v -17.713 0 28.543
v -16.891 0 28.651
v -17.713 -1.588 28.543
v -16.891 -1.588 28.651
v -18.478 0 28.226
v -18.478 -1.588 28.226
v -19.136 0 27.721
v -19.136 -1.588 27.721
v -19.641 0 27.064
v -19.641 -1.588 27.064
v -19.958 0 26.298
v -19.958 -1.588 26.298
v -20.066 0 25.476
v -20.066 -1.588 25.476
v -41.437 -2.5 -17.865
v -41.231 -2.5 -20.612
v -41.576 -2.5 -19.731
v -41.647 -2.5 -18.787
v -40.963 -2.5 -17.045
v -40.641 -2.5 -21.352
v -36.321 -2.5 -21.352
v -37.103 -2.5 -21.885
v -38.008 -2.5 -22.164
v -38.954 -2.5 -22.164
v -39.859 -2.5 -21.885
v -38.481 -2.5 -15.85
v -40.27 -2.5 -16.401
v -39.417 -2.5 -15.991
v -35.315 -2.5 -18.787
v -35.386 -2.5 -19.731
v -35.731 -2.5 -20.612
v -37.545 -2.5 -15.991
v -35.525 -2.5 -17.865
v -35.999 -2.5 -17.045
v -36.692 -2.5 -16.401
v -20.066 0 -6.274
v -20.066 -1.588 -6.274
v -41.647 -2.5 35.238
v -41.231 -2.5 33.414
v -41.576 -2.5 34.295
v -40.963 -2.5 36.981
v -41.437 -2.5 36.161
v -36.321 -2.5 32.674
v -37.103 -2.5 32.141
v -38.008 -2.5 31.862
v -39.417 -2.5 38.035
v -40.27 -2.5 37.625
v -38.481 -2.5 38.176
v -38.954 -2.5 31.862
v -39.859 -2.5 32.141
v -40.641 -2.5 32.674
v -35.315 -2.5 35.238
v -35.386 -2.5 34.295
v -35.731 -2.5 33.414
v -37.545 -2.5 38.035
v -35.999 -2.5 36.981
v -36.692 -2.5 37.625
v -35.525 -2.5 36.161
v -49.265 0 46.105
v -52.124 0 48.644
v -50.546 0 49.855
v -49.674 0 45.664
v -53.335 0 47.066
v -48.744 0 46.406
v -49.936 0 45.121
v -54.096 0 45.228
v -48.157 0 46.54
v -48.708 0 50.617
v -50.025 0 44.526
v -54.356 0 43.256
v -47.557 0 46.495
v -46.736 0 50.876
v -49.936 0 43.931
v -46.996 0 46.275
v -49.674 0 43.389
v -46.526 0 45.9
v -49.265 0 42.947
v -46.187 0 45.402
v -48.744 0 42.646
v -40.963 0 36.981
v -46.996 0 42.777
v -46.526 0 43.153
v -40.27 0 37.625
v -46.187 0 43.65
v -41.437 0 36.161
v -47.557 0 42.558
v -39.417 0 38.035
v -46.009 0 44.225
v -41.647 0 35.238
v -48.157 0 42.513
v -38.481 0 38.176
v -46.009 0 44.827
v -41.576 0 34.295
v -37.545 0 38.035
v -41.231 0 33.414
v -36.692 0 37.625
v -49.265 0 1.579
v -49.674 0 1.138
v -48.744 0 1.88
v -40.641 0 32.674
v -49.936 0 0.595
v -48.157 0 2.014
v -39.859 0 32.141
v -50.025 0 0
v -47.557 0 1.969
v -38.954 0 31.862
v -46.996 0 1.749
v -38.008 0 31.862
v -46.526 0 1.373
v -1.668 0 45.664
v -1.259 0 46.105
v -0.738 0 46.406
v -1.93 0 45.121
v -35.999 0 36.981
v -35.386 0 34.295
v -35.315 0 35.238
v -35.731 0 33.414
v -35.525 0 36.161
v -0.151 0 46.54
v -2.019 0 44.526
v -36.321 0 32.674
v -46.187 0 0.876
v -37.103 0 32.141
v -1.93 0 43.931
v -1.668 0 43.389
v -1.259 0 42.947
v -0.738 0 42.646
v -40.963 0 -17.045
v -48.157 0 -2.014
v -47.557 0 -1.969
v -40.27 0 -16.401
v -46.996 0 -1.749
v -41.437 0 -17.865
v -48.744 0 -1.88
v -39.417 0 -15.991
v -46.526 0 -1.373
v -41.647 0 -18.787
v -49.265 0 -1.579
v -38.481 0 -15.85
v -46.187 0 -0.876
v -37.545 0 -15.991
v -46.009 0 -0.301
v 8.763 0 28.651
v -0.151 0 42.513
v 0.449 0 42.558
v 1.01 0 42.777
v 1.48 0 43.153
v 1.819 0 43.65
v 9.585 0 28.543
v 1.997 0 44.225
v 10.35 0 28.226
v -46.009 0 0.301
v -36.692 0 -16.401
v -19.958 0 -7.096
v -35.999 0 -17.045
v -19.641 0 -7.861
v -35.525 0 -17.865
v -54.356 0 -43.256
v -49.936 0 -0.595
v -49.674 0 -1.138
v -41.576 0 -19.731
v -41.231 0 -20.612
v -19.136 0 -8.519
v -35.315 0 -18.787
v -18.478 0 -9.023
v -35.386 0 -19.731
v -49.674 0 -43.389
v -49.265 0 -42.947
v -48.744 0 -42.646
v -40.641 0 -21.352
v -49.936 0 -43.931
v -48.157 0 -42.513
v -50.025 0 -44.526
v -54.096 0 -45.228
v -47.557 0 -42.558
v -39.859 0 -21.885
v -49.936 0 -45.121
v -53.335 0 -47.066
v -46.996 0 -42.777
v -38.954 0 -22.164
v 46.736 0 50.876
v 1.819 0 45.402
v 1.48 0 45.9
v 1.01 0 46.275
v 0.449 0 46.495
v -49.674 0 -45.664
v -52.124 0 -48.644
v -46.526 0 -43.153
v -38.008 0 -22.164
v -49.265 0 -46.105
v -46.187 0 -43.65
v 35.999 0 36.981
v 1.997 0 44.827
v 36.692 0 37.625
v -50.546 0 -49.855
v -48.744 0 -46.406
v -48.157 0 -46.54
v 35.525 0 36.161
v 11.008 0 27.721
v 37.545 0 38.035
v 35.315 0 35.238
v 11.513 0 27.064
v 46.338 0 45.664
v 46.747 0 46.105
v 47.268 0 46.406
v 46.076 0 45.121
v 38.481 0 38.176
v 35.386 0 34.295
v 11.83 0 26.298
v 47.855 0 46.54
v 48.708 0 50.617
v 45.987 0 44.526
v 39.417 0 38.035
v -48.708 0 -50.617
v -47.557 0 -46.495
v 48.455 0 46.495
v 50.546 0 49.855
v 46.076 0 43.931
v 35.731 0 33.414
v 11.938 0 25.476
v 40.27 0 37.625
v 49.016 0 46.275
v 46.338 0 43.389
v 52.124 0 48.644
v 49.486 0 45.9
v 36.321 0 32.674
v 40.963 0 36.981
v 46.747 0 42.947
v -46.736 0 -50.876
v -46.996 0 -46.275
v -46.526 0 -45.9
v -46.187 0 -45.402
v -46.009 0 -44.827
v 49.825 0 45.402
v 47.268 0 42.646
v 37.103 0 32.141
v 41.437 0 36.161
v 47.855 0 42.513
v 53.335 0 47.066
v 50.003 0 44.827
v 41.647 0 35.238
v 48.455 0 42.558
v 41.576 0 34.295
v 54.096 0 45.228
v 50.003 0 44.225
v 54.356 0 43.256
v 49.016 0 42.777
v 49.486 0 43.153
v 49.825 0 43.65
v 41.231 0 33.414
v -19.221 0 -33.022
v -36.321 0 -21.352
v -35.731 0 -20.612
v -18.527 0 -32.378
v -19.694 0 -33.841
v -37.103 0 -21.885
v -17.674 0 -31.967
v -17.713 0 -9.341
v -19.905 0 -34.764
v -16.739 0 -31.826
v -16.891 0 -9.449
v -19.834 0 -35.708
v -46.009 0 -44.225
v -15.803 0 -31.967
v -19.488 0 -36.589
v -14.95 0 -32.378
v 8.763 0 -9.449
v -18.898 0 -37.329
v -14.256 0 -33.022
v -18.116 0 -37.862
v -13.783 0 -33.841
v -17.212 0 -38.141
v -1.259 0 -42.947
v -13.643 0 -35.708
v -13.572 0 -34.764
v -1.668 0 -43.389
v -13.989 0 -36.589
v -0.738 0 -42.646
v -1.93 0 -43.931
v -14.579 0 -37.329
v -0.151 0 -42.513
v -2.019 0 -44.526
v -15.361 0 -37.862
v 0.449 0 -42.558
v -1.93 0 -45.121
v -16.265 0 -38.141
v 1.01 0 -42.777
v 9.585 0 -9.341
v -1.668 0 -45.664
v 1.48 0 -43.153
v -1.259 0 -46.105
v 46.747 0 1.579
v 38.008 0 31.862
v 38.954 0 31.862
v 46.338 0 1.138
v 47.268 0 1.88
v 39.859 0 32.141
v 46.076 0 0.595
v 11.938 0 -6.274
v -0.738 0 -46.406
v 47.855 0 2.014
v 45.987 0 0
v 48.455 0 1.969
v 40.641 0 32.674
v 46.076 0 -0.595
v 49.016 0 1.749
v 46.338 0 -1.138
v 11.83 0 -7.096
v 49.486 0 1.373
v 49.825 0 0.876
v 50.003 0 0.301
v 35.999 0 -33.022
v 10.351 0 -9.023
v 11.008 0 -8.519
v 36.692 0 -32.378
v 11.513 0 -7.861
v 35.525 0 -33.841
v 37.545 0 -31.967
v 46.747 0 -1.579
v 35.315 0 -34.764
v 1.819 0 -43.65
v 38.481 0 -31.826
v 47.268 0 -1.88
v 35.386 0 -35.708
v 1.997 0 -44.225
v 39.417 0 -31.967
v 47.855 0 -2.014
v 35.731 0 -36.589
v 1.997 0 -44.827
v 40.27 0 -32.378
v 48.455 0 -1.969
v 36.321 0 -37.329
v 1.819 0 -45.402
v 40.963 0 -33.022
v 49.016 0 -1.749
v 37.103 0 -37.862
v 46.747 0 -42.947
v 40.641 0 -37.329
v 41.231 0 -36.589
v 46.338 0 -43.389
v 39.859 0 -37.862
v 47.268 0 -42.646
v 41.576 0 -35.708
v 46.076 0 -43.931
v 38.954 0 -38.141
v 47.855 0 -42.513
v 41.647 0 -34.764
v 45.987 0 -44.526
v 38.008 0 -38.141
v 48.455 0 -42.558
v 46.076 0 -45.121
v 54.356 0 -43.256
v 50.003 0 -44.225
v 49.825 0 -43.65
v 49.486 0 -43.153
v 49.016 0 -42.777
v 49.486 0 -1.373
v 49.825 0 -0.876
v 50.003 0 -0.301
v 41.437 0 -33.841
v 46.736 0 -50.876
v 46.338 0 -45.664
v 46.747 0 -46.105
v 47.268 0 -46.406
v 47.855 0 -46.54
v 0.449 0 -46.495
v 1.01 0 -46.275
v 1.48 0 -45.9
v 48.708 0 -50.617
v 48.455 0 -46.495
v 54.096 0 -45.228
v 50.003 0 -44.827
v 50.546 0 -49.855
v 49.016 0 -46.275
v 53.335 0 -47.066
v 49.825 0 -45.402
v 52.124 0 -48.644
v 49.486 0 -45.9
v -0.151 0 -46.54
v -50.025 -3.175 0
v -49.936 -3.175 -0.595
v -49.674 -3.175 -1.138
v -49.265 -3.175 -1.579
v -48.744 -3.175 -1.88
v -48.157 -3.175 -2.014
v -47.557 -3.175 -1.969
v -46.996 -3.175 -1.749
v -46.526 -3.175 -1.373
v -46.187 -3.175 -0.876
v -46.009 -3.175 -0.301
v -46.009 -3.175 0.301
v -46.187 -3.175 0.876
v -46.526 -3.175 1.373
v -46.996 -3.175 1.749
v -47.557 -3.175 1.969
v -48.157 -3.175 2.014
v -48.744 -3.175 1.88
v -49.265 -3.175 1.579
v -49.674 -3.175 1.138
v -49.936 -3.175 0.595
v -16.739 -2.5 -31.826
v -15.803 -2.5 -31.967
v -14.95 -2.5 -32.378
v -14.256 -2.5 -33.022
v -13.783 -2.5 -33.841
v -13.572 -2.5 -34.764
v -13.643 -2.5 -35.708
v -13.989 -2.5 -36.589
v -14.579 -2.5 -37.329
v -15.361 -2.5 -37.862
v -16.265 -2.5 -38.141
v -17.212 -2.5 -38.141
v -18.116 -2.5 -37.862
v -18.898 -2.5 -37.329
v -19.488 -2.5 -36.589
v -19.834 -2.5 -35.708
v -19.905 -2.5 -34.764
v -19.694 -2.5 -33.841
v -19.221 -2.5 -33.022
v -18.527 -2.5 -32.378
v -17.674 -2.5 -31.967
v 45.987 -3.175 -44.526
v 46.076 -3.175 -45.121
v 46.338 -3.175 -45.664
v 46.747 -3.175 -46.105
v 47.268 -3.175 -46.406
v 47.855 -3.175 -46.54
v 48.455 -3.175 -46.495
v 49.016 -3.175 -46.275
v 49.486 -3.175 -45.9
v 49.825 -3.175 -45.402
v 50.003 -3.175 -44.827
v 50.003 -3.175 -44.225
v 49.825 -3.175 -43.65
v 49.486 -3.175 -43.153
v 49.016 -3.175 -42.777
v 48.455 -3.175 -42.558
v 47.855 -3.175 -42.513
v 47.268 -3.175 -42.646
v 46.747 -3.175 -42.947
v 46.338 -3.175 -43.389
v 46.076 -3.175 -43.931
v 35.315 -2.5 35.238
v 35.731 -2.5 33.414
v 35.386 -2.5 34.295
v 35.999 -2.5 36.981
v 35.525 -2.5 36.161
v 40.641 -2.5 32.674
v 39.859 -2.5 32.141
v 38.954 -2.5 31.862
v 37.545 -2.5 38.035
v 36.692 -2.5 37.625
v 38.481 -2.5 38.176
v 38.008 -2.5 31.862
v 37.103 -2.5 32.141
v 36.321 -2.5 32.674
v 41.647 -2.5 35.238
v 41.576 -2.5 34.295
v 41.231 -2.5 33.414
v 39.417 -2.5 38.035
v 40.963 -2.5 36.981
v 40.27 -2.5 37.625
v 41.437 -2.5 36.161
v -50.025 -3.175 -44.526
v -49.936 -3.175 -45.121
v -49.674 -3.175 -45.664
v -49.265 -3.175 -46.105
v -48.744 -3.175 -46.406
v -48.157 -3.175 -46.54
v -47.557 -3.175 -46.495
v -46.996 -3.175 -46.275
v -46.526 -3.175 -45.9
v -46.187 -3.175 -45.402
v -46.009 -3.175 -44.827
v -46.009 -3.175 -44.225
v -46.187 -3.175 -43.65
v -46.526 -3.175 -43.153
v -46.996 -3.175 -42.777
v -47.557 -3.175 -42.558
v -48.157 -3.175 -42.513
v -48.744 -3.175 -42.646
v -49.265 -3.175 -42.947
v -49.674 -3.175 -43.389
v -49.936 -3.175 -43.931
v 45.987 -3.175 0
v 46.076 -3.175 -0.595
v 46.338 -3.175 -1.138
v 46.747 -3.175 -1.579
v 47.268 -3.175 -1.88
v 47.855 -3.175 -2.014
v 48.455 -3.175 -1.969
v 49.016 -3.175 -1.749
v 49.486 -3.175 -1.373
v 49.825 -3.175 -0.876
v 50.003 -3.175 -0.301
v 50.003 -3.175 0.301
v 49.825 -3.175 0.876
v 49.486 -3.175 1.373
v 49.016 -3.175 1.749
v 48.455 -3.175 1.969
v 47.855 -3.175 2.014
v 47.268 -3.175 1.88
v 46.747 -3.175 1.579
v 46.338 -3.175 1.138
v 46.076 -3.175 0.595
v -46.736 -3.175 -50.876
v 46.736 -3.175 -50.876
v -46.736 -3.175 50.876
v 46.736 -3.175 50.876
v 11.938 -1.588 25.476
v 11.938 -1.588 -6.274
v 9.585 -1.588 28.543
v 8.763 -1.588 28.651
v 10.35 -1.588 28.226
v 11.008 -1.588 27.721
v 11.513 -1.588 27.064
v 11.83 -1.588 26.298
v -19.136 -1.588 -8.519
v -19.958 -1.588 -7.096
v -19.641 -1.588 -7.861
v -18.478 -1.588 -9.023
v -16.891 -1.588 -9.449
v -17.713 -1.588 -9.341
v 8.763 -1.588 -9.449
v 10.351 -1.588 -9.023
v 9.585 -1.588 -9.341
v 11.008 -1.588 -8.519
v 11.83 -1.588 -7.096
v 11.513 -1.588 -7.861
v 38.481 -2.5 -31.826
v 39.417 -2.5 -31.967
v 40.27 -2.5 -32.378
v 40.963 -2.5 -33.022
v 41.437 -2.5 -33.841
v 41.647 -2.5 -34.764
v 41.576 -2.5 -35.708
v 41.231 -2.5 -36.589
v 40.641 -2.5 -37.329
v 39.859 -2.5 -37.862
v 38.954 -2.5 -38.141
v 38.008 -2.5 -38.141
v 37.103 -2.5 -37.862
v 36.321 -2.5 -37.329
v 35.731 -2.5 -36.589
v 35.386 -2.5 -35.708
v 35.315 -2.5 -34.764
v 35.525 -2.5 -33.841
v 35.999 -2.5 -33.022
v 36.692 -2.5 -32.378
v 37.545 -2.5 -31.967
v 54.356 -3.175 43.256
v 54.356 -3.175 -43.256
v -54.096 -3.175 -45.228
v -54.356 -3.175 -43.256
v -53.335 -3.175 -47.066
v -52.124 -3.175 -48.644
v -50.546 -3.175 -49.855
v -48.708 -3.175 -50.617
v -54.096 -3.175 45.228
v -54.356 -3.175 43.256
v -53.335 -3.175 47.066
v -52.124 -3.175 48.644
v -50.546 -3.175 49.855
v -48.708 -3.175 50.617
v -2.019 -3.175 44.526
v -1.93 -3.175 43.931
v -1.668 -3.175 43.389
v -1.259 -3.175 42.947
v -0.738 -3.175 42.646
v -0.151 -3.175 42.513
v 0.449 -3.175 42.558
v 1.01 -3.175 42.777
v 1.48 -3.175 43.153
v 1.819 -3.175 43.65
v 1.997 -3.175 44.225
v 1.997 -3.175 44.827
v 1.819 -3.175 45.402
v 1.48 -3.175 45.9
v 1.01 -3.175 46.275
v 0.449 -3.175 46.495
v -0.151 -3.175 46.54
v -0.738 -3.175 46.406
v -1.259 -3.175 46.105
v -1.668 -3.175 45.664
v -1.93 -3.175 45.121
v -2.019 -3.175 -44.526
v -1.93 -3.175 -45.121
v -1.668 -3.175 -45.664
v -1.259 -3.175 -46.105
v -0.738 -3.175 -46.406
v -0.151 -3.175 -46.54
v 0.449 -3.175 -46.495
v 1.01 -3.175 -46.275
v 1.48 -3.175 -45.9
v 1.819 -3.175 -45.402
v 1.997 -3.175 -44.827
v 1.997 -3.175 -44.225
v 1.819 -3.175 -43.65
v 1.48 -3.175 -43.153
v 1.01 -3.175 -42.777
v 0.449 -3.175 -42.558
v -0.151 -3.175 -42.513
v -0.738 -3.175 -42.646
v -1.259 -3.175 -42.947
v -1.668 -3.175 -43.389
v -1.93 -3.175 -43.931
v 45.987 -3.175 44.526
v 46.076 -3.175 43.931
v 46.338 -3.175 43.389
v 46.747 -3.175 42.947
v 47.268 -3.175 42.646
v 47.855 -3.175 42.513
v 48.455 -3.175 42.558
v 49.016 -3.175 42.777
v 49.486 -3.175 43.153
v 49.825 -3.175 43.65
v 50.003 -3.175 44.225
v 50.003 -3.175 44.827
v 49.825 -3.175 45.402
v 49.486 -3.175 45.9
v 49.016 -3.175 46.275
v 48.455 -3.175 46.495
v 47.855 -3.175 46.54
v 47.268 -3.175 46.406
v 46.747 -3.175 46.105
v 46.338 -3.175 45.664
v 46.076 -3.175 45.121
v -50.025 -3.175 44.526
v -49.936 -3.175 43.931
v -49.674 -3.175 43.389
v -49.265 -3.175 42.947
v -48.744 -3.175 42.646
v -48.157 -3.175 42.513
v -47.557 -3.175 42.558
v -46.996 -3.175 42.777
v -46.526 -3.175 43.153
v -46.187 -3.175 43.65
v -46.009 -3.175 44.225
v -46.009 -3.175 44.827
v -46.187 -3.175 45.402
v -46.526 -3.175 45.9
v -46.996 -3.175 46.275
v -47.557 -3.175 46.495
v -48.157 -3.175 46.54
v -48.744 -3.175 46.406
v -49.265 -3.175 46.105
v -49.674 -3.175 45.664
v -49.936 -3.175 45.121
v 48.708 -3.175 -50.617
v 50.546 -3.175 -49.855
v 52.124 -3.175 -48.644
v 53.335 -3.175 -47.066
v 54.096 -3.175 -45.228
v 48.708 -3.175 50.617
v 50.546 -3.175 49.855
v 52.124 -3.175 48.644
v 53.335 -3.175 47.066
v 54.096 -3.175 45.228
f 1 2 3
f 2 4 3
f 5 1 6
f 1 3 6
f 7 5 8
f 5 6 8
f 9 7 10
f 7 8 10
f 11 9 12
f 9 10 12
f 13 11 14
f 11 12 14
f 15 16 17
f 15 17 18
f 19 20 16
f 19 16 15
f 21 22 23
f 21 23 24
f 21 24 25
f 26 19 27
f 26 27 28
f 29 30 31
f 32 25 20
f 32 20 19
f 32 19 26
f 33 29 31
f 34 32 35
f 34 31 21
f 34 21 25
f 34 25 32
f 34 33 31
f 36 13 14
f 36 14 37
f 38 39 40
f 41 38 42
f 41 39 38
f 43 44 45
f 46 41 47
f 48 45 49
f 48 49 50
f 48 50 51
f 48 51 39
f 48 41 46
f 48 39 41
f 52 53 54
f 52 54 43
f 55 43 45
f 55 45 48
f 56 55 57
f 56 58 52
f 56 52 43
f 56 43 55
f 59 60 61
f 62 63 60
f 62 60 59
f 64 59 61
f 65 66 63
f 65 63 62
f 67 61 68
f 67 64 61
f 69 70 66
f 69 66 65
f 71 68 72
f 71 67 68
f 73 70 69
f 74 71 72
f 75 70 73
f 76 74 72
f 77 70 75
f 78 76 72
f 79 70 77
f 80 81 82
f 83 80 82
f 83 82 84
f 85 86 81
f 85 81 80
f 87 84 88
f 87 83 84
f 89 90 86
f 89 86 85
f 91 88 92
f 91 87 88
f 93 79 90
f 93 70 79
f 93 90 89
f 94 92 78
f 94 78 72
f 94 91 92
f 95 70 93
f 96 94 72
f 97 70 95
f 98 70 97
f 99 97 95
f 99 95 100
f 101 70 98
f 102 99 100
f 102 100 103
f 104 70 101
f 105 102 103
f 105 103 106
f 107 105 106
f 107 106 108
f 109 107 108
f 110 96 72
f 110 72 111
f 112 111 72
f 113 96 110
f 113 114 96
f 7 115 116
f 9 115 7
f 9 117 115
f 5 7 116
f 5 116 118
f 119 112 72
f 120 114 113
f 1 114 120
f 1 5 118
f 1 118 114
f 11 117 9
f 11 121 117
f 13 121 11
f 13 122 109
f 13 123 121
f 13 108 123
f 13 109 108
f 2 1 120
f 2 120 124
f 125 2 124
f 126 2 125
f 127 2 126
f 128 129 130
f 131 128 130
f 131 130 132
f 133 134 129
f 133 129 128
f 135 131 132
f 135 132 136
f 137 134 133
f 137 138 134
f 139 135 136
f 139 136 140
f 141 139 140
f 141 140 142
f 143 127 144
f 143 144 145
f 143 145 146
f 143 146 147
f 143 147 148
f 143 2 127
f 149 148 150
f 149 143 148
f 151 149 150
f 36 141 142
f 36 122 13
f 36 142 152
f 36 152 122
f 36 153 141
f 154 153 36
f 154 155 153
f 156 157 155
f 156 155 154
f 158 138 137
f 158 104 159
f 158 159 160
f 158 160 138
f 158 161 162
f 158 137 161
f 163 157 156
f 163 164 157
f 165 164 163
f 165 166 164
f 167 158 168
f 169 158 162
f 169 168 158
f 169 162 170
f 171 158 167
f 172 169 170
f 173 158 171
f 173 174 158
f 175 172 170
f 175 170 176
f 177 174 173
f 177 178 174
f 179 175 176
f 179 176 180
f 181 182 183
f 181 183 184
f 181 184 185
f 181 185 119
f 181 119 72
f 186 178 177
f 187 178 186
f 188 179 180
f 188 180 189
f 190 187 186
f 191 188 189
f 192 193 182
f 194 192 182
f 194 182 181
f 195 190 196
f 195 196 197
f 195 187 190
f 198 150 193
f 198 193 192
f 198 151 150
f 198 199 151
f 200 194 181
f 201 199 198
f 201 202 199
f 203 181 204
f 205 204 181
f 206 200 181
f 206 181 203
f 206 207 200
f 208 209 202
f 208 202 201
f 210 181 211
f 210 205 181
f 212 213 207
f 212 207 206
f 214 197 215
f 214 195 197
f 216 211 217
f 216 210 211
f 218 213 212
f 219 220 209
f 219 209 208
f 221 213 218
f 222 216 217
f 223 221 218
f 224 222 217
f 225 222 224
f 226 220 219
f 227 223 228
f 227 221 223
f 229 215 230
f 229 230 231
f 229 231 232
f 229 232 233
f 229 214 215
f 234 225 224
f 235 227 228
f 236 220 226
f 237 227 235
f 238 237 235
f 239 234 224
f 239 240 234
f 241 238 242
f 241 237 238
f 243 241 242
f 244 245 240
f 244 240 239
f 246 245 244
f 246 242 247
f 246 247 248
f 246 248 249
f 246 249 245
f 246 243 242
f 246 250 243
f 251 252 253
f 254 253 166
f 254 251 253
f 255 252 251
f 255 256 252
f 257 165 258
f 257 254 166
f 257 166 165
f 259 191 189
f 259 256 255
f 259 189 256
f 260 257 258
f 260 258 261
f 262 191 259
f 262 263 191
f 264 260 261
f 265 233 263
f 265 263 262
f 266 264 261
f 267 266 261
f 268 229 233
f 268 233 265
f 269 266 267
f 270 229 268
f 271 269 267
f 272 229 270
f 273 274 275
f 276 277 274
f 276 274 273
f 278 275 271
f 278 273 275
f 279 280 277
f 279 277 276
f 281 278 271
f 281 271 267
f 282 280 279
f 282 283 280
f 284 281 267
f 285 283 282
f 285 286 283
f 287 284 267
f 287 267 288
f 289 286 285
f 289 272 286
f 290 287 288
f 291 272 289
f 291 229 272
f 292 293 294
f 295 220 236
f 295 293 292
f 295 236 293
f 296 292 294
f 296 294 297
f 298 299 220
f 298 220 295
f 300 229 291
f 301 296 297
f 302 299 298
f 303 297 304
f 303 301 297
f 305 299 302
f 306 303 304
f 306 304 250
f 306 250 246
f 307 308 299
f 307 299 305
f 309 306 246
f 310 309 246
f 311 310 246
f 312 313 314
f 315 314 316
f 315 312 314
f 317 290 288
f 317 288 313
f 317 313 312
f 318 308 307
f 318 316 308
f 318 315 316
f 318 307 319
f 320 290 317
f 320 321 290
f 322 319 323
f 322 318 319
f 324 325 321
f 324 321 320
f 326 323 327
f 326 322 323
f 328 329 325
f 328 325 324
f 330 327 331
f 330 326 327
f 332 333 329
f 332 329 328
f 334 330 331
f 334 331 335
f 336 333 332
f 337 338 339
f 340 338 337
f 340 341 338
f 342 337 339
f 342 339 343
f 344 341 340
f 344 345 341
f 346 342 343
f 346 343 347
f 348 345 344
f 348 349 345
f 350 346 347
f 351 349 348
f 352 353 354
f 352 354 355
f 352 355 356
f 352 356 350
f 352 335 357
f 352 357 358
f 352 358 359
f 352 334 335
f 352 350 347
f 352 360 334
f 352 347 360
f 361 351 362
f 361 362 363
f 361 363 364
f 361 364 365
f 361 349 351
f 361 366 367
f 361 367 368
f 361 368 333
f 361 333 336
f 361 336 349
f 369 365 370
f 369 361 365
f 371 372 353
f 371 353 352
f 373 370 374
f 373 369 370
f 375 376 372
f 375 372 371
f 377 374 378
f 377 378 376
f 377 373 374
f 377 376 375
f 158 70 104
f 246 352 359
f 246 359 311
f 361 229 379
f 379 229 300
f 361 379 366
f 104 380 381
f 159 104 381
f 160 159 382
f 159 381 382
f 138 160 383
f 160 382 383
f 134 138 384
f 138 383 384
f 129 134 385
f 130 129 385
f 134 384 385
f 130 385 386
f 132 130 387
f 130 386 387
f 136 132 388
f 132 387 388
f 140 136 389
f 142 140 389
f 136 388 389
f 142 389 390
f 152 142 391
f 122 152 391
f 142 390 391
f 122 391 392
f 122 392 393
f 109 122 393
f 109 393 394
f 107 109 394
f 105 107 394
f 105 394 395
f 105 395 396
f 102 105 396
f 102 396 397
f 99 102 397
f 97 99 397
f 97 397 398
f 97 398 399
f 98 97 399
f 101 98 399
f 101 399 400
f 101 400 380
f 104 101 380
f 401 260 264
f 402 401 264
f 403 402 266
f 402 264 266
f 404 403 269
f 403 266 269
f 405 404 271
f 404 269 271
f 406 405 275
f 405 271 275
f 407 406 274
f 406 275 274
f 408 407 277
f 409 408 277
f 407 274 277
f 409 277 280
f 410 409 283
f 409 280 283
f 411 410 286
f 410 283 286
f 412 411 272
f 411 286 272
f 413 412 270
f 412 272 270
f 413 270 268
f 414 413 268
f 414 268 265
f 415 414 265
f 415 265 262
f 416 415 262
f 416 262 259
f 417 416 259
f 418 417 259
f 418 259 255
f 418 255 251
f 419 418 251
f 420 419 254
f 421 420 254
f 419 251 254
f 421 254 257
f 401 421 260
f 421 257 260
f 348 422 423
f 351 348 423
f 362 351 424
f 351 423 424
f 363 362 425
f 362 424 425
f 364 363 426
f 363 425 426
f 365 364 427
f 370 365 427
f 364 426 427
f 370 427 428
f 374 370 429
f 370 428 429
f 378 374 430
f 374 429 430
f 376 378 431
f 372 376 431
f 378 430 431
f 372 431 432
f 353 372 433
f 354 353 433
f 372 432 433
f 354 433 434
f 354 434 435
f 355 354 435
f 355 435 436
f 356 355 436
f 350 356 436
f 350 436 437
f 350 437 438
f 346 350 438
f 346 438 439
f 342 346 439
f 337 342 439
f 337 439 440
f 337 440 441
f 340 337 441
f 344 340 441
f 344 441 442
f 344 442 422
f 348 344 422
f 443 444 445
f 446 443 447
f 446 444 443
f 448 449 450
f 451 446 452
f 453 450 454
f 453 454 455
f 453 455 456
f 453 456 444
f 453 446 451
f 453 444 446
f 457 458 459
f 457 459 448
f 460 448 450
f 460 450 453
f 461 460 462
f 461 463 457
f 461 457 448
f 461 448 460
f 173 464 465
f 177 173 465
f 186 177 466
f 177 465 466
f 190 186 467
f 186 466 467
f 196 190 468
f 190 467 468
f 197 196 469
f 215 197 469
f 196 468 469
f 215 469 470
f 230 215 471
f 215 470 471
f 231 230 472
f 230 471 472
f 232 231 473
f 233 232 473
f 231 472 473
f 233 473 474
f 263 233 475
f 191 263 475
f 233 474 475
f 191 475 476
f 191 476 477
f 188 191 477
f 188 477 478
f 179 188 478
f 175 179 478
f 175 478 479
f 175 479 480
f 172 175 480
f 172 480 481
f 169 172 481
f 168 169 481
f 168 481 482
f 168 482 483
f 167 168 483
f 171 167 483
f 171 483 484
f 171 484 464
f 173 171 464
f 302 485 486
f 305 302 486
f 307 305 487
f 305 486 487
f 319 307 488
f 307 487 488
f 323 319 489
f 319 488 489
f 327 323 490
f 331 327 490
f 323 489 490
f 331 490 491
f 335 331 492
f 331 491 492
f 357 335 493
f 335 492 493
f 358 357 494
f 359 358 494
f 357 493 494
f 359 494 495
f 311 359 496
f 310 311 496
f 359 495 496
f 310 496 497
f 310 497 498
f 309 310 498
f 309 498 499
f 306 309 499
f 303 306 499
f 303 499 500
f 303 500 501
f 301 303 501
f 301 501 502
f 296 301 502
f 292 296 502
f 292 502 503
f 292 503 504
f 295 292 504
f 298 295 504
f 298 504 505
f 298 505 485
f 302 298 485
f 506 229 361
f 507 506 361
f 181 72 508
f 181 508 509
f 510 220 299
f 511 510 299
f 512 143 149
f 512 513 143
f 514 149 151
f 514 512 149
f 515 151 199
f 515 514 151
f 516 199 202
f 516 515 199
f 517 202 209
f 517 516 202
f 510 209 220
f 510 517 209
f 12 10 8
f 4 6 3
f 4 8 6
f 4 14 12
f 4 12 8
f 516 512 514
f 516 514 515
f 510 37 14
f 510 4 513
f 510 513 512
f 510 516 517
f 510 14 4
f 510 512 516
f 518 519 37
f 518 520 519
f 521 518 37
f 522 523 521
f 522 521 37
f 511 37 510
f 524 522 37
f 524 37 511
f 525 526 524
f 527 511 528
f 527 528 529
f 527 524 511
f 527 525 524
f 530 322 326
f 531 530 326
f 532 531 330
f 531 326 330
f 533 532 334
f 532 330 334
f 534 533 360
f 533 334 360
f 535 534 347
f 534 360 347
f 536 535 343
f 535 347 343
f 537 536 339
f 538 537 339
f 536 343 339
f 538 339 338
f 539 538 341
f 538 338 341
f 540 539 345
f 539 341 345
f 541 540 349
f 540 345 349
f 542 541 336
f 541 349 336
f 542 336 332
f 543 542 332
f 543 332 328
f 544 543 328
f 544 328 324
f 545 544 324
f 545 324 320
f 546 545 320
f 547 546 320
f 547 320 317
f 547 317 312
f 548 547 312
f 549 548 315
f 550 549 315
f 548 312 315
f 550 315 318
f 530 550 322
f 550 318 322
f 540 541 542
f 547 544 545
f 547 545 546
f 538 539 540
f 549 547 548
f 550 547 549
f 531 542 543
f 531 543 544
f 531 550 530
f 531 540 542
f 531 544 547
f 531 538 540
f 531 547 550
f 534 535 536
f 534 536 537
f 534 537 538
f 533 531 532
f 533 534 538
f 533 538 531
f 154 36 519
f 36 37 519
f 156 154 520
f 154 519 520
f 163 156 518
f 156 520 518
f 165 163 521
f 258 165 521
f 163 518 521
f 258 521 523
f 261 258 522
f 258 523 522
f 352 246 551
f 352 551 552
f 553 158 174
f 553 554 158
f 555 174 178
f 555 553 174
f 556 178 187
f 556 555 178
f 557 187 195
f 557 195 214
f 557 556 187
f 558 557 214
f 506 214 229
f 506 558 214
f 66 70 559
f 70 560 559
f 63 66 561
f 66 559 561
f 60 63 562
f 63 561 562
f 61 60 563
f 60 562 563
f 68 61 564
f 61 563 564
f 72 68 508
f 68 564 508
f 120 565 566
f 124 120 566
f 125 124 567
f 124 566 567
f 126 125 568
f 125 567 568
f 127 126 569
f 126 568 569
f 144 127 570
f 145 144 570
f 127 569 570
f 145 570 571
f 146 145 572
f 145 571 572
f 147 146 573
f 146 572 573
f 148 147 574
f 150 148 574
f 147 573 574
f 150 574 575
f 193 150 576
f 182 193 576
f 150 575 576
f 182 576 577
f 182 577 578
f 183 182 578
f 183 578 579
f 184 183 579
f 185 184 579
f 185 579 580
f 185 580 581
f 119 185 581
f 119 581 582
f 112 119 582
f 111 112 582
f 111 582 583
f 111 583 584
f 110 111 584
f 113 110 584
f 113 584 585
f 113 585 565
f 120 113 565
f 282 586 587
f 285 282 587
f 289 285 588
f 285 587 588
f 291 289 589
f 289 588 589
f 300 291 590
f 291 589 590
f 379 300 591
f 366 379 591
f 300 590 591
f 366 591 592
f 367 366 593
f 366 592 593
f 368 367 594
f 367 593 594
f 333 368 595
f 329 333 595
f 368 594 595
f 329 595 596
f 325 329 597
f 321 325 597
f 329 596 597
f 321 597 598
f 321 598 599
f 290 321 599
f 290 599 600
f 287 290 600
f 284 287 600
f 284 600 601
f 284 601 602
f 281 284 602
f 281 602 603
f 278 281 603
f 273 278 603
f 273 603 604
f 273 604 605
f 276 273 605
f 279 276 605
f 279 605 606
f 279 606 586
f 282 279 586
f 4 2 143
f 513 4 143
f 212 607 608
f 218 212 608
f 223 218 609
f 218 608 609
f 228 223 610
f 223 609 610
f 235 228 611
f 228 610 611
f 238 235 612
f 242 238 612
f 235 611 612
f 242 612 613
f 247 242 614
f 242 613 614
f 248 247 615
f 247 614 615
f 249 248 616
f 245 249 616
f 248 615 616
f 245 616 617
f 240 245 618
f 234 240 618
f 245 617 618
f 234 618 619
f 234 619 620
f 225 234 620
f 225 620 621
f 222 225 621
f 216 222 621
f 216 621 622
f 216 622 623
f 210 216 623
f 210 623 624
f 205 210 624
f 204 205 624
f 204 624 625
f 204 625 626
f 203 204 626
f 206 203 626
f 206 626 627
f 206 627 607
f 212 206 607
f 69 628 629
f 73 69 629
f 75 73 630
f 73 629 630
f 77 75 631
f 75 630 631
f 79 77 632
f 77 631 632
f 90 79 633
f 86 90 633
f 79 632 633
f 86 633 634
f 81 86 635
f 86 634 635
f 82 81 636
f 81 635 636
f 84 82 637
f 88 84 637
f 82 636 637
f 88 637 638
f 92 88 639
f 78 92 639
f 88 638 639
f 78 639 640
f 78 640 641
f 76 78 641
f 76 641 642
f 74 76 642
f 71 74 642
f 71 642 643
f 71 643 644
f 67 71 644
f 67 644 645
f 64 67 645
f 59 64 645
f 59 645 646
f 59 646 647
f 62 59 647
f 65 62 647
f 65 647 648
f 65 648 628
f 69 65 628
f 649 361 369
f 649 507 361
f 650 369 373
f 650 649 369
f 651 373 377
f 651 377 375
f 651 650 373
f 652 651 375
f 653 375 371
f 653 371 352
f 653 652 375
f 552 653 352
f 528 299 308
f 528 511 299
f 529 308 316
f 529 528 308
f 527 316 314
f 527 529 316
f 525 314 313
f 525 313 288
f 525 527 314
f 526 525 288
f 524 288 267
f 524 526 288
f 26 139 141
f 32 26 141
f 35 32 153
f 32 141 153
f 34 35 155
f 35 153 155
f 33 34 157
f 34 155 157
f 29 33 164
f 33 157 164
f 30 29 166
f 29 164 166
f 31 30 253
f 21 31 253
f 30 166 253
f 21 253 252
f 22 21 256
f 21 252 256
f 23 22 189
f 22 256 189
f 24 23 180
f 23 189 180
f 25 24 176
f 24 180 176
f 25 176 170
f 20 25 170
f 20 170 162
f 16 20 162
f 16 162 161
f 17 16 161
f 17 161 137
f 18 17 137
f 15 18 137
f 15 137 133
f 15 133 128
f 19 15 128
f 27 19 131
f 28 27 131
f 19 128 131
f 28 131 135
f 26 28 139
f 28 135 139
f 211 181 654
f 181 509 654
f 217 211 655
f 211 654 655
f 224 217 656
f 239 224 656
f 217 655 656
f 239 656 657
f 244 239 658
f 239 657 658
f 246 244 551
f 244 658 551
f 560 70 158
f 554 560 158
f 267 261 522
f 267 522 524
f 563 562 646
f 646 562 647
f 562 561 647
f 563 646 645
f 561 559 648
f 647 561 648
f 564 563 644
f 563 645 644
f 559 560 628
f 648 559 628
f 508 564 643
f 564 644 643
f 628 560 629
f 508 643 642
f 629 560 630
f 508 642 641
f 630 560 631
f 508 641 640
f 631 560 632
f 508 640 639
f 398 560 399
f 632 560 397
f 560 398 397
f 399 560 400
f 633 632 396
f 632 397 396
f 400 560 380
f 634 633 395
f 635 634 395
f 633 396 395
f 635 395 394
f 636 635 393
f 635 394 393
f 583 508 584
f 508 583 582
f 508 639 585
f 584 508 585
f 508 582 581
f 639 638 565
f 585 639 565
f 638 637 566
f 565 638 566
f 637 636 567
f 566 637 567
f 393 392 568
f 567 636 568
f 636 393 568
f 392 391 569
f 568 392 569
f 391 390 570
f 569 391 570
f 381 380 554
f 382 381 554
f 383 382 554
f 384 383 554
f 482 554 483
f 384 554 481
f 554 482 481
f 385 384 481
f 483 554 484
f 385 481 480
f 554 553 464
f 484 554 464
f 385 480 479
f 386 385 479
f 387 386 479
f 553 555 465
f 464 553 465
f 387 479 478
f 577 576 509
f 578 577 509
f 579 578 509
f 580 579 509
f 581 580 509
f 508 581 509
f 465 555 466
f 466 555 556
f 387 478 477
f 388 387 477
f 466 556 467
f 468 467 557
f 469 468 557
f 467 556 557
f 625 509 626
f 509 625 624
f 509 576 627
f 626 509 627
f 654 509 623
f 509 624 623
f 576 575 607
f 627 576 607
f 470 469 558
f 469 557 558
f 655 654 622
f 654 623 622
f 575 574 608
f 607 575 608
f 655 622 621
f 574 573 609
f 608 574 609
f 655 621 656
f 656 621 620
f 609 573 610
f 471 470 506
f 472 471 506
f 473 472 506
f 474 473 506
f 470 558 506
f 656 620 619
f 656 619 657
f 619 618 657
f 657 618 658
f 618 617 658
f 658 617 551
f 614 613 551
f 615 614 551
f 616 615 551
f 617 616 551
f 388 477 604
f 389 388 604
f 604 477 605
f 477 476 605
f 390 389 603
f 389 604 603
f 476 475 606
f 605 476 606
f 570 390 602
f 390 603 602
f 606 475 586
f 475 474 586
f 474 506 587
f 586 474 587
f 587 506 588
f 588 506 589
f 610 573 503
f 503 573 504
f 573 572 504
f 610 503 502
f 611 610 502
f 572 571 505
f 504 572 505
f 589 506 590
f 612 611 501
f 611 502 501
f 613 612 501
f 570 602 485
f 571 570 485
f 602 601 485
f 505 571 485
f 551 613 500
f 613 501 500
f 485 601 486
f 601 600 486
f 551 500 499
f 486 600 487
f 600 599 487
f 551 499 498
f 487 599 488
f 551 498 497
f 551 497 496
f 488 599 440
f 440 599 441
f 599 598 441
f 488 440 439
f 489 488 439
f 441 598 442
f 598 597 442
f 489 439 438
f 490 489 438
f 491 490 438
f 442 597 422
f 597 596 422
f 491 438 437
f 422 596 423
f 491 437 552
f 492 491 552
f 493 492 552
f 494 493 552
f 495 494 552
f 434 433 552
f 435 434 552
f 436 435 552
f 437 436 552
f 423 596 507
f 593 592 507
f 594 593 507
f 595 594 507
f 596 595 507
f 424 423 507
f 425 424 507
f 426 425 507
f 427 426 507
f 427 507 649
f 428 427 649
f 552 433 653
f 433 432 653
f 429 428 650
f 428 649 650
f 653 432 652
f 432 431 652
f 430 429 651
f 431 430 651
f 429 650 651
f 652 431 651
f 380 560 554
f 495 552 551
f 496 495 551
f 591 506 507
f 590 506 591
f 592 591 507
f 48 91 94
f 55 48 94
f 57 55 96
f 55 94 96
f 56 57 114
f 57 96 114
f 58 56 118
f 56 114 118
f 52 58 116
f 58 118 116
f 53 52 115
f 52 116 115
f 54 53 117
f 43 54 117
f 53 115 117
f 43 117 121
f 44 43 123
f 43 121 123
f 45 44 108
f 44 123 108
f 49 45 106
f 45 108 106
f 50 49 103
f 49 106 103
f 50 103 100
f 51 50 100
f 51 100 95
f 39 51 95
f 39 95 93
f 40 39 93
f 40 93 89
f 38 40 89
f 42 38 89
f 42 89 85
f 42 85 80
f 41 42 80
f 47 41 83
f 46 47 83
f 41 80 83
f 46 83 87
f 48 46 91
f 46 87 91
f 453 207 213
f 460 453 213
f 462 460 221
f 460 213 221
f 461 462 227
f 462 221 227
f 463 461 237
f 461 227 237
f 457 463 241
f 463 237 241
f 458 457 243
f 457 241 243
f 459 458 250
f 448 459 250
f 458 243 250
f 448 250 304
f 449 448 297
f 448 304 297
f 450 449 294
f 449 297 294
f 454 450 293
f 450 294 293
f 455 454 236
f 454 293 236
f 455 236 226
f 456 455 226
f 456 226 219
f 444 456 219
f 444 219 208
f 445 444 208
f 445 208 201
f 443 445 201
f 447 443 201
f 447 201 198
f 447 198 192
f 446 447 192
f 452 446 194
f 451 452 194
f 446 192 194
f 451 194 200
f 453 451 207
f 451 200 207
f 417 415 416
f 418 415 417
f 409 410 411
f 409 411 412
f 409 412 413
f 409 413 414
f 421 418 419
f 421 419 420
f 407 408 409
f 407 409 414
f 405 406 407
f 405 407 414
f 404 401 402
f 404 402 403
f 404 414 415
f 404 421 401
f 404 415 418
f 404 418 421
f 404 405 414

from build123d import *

# Parameters (mm, degrees)
SKETCH1_W              = 108.712
SKETCH1_H              = 101.7524
BOSS_EXTRUDE1_DEPTH    = 3.175
SKETCH1_4_W            = 32.004
SKETCH1_4_H            = 38.1
CUT_EXTRUDE1_DEPTH     = 1.5875
SKETCH4_R              = 3.175
CUT_EXTRUDE2_DEPTH     = 2.5
FILLET1_R              = 7.62
F_10_32_TAPPED_HOLE1_D = 4.0386
FILLET2_R              = 3.175


with BuildPart() as part:
    # Sketch1 → Boss-Extrude1 (new body)
    with BuildSketch(Plane(origin=(0, 0, 0), x_dir=(1, 0, 0), z_dir=(0, 1, 0))):
        Rectangle(SKETCH1_W, SKETCH1_H)
    extrude(amount=-BOSS_EXTRUDE1_DEPTH)

    # Sketch1<4> → Cut-Extrude1 (cut)
    with BuildSketch(Plane(origin=(0, 0, 0), x_dir=(1, 0, 0), z_dir=(0, 1, 0))):
        with Locations((-4.064, -9.6012)):
            Rectangle(SKETCH1_4_W, SKETCH1_4_H)
    extrude(amount=-CUT_EXTRUDE1_DEPTH, mode=Mode.SUBTRACT)

    # Sketch4 → Cut-Extrude2 (cut)
    with BuildSketch(Plane(origin=(0, 0, 0), x_dir=(1, 0, 0), z_dir=(0, 1, 0))):
        with Locations((-38.481, 19.0246)):
            Circle(SKETCH4_R)
        with Locations((-16.7386, 35.0012)):
            Circle(SKETCH4_R)
        with Locations((38.481, 35.0012)):
            Circle(SKETCH4_R)
        with Locations((38.481, -35.0012)):
            Circle(SKETCH4_R)
        with Locations((-38.481, -35.0012)):
            Circle(SKETCH4_R)
    extrude(amount=-CUT_EXTRUDE2_DEPTH, mode=Mode.SUBTRACT)

    # Fillet1
    fillet1_edges = [part.edges().sort_by_distance(p)[0] for p in [
        (-54.356, -1.5875, -50.8762),
        (54.356, -1.5875, -50.8762),
        (54.356, -1.5875, 50.8762),
        (-54.356, -1.5875, 50.8762),
    ]]
    fillet(fillet1_edges, radius=FILLET1_R)

    # #10-32 Tapped Hole1 (through all)
    with Locations(Plane(origin=(0, 0, 0), x_dir=(1, 0, 0), z_dir=(0, 1, 0))):
        with Locations((-48.006, 44.5262), (48.006, 44.5262), (48.006, -44.5262), (-48.006, -44.5262), (0, -44.5262), (-48.006, 0), (48.006, 0), (0, 44.5262)):
            Hole(F_10_32_TAPPED_HOLE1_D / 2)

    # Fillet2
    fillet2_edges = [part.edges().sort_by_distance(p)[0] for p in [
        (-20.066, -0.79375, -9.4488),
        (11.938, -0.79375, -9.4488),
        (11.938, -0.79375, 28.6512),
        (-20.066, -0.79375, 28.6512),
    ]]
    fillet(fillet2_edges, radius=FILLET2_R)


solid = part.part
